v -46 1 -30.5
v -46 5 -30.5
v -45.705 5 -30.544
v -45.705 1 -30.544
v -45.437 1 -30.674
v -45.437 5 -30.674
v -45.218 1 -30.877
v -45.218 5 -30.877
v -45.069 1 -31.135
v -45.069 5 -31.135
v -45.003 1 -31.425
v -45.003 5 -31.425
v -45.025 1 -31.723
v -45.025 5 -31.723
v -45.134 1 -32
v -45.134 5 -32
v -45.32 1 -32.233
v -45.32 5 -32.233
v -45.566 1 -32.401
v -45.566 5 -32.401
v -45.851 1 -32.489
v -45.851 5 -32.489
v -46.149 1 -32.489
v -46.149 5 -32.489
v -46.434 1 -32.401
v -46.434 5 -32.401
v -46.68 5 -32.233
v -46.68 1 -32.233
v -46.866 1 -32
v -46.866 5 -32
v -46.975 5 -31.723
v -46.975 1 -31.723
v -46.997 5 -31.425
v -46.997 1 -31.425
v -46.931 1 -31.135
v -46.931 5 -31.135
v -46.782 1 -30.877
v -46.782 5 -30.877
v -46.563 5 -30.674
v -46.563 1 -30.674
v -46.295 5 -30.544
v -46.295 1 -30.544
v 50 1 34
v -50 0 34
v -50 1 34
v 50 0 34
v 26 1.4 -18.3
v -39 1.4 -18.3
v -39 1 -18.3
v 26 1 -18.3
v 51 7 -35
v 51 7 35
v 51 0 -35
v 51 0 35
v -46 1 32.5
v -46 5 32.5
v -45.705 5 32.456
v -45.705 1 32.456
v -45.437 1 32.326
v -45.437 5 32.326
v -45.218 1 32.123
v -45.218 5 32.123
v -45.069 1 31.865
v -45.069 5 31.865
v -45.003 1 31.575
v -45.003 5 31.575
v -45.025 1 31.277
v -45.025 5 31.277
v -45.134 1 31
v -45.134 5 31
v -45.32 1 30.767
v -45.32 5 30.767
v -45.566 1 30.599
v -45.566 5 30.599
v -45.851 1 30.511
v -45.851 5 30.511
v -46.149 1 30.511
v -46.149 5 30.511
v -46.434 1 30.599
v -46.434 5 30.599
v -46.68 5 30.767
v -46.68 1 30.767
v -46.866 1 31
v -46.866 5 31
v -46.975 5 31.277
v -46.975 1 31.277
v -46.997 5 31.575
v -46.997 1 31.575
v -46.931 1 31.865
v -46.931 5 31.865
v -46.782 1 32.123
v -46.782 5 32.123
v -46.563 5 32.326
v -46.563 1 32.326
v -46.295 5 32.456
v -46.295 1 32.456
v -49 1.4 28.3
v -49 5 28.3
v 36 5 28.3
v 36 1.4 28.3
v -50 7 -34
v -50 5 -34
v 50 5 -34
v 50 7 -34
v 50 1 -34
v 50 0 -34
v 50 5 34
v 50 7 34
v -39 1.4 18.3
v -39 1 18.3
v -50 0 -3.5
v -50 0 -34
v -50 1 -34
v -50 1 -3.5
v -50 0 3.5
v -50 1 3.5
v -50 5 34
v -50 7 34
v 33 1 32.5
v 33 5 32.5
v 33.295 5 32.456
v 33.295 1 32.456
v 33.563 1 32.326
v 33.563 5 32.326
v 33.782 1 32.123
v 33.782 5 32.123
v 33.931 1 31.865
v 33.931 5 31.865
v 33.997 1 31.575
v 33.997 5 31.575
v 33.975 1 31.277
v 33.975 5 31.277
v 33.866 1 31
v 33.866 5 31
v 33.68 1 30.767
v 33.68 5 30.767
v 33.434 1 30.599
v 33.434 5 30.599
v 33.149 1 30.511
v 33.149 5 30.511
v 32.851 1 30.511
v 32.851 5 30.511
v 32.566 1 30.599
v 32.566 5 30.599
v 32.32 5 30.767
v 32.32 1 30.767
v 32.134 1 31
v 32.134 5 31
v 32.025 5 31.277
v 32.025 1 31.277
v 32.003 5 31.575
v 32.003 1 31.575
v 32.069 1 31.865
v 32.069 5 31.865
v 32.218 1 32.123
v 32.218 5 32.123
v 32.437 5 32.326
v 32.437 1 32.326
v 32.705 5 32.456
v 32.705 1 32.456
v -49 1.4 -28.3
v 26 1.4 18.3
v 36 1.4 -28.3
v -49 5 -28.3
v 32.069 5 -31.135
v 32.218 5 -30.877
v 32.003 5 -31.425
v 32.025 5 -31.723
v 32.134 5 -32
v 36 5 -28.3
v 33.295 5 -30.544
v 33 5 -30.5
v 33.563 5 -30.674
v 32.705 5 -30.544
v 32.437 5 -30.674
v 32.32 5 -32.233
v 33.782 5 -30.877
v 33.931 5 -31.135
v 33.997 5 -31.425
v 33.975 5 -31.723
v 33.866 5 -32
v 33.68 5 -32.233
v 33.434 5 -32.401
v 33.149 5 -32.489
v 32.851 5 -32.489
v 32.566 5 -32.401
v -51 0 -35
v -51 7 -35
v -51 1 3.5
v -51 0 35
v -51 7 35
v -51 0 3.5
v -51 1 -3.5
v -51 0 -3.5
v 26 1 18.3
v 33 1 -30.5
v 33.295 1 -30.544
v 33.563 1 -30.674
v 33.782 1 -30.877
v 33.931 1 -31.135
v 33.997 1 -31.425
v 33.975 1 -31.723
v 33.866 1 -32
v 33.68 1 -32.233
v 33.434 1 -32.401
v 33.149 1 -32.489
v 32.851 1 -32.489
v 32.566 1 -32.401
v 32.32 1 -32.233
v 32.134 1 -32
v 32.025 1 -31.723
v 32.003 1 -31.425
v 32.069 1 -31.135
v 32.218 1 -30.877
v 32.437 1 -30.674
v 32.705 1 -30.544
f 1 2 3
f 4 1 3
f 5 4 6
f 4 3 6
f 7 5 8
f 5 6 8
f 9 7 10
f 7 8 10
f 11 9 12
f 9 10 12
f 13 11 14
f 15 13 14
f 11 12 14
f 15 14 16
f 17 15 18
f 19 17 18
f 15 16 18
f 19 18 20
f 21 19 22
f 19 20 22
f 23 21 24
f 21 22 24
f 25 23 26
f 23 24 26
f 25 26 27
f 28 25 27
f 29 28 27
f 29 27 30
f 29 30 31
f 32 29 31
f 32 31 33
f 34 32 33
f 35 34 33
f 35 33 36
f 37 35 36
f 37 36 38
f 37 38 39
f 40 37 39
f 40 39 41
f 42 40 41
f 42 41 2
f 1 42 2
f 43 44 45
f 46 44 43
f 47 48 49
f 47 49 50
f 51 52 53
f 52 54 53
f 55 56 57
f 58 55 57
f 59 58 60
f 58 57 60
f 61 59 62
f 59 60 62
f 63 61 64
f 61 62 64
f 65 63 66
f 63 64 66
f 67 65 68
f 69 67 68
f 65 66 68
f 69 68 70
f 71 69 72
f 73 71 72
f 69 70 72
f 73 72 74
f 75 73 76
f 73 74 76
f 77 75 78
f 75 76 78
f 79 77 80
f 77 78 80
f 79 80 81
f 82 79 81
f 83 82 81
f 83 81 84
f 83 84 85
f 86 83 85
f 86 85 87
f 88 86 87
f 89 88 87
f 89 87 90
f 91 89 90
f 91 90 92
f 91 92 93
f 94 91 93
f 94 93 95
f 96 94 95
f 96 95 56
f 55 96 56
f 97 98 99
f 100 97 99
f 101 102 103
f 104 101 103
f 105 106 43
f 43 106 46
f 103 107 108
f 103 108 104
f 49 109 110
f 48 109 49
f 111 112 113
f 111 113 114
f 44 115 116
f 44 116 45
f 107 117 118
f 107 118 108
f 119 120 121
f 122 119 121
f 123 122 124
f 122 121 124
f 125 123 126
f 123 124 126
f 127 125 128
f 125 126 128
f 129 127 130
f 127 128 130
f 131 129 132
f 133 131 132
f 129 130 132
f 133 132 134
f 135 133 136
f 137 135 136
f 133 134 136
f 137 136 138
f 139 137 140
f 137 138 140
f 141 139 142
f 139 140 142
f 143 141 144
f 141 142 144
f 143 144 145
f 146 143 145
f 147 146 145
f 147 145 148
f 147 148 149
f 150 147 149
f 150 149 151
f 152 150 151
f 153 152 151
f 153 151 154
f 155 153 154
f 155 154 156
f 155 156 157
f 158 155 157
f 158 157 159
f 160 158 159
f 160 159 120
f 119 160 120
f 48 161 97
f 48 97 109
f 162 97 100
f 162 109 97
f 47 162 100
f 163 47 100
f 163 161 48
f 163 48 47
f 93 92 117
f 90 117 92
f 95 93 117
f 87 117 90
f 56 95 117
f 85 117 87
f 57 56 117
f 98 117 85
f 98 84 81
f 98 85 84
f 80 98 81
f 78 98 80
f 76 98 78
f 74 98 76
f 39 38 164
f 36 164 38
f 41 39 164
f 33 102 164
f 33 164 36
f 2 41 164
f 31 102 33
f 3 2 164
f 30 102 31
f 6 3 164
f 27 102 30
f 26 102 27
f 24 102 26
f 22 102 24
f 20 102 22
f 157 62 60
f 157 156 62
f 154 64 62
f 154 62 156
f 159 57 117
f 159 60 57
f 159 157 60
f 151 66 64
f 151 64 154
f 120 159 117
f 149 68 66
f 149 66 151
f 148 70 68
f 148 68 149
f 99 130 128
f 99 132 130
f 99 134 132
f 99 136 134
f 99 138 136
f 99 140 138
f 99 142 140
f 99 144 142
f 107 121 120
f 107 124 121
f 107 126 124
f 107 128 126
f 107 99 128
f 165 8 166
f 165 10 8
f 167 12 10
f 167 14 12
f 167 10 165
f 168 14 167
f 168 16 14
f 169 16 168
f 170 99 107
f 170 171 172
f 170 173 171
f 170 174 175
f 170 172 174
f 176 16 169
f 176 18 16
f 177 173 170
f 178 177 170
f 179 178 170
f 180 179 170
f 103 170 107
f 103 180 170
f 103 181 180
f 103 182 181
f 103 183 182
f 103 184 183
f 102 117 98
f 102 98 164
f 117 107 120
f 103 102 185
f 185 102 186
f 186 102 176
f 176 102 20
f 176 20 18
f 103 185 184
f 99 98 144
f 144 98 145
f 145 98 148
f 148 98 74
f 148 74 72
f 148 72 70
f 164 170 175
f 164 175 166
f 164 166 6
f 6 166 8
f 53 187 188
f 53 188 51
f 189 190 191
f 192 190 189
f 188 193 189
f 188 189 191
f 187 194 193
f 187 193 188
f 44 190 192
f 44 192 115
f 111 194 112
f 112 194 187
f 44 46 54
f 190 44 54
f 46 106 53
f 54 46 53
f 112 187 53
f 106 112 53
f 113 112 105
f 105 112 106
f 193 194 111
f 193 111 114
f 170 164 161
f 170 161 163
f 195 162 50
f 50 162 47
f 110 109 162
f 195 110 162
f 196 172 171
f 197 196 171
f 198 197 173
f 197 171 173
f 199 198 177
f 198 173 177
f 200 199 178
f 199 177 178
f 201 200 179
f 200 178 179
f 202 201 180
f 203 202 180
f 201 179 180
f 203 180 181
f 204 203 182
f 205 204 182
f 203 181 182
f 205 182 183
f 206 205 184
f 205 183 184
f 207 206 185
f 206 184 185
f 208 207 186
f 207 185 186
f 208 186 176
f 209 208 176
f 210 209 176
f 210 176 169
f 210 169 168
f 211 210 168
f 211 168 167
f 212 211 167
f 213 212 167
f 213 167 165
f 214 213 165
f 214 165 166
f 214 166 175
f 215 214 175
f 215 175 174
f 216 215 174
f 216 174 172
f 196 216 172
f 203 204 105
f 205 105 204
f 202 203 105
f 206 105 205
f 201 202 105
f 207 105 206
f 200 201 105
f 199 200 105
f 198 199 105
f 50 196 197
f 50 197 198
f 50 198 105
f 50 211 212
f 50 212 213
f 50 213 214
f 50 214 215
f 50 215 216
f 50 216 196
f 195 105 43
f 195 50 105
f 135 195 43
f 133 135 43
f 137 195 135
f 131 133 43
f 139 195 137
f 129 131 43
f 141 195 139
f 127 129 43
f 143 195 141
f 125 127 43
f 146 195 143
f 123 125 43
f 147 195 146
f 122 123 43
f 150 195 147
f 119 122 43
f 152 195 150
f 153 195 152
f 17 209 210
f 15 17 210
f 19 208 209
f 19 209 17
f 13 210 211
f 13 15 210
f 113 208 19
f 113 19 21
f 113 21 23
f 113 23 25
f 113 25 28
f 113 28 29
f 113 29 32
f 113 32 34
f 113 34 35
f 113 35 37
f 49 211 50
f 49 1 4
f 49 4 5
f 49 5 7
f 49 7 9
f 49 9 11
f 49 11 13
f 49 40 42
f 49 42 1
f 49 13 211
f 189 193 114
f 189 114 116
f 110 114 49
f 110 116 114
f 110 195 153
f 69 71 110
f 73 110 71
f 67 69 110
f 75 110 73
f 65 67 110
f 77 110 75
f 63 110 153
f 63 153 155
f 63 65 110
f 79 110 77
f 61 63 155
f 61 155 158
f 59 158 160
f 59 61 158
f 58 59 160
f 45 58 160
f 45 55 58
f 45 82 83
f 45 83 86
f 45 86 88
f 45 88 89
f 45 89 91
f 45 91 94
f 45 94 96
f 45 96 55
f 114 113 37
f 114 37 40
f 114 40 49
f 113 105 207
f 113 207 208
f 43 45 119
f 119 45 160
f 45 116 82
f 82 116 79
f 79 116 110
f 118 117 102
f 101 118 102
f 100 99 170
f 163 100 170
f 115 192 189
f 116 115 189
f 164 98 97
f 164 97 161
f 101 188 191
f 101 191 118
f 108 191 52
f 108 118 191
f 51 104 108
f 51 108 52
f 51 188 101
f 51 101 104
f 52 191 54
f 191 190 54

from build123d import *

# Parameters (mm, degrees)
SKETCH_1_W          = 102
SKETCH_1_H          = 70
EXTRUDE_1_DEPTH     = 5
SKETCH_2_W          = 85
SKETCH_2_H          = 56.6
CUT_EXTRUDE_1_DEPTH = 3.6
SKETCH_3_R          = 1
CUT_EXTRUDE_2_DEPTH = 6
SKETCH_5_W          = 100
SKETCH_5_H          = 68
CUT_EXTRUDE_4_DEPTH = 1
SKETCH_6_W          = 7
SKETCH_6_H          = 1
CUT_EXTRUDE_5_DEPTH = 1
SKETCH_7_W          = 65
SKETCH_7_H          = 36.6
CUT_EXTRUDE_6_DEPTH = 10
SKETCH_8_W          = 102
SKETCH_8_H          = 70
SKETCH_8_W_2        = 100
SKETCH_8_H_2        = 68
EXTRUDE_2_DEPTH     = 2


with BuildPart() as part:
    # Эскиз1 → Бобышка-Вытянуть1 (new body)
    with BuildSketch(Plane(origin=(0, 0, 0), x_dir=(1, 0, 0), z_dir=(0, 1, 0))):
        Rectangle(SKETCH_1_W, SKETCH_1_H)
    extrude(amount=EXTRUDE_1_DEPTH)

    # Эскиз2 → Вырез-Вытянуть1 (cut)
    with BuildSketch(Plane(origin=(0, 5, 0), x_dir=(1, 0, 0), z_dir=(0, 1, 0))):
        with Locations((-6.5, 0)):
            Rectangle(SKETCH_2_W, SKETCH_2_H)
    extrude(amount=-CUT_EXTRUDE_1_DEPTH, mode=Mode.SUBTRACT)

    # Эскиз3 → Вырез-Вытянуть2 (cut)
    with BuildSketch(Plane(origin=(0, 5, 0), x_dir=(1, 0, 0), z_dir=(0, 1, 0))):
        with Locations(Location((33, -31.5, 0), (0, 0, 270))):
            Circle(SKETCH_3_R)
        with Locations(Location((33, 31.5, 0), (0, 0, 270))):
            Circle(SKETCH_3_R)
        with Locations(Location((-46, -31.5, 0), (0, 0, 270))):
            Circle(SKETCH_3_R)
        with Locations(Location((-46, 31.5, 0), (0, 0, 270))):
            Circle(SKETCH_3_R)
    extrude(amount=-CUT_EXTRUDE_2_DEPTH, mode=Mode.SUBTRACT)

    # Эскиз5 → Вырез-Вытянуть4 (cut)
    with BuildSketch(Plane.XZ):
        Rectangle(SKETCH_5_W, SKETCH_5_H)
    extrude(amount=-CUT_EXTRUDE_4_DEPTH, mode=Mode.SUBTRACT)

    # Эскиз6 → Вырез-Вытянуть5 (cut)
    with BuildSketch(Plane.ZY.offset(51)):
        with Locations((0, 0.5)):
            Rectangle(SKETCH_6_W, SKETCH_6_H)
    extrude(amount=-CUT_EXTRUDE_5_DEPTH, mode=Mode.SUBTRACT)

    # Эскиз7 → Вырез-Вытянуть6 (cut)
    with BuildSketch(Plane(origin=(0, 1.4, 0), x_dir=(1, 0, 0), z_dir=(0, 1, 0))):
        with Locations((-6.5, 0)):
            Rectangle(SKETCH_7_W, SKETCH_7_H)
    extrude(amount=-CUT_EXTRUDE_6_DEPTH, mode=Mode.SUBTRACT)

    # Эскиз8 → Бобышка-Вытянуть2 (add)
    with BuildSketch(Plane(origin=(0, 5, 0), x_dir=(1, 0, 0), z_dir=(0, 1, 0))):
        Rectangle(SKETCH_8_W, SKETCH_8_H)
        Rectangle(SKETCH_8_W_2, SKETCH_8_H_2, mode=Mode.SUBTRACT)
    extrude(amount=EXTRUDE_2_DEPTH)


solid = part.part
